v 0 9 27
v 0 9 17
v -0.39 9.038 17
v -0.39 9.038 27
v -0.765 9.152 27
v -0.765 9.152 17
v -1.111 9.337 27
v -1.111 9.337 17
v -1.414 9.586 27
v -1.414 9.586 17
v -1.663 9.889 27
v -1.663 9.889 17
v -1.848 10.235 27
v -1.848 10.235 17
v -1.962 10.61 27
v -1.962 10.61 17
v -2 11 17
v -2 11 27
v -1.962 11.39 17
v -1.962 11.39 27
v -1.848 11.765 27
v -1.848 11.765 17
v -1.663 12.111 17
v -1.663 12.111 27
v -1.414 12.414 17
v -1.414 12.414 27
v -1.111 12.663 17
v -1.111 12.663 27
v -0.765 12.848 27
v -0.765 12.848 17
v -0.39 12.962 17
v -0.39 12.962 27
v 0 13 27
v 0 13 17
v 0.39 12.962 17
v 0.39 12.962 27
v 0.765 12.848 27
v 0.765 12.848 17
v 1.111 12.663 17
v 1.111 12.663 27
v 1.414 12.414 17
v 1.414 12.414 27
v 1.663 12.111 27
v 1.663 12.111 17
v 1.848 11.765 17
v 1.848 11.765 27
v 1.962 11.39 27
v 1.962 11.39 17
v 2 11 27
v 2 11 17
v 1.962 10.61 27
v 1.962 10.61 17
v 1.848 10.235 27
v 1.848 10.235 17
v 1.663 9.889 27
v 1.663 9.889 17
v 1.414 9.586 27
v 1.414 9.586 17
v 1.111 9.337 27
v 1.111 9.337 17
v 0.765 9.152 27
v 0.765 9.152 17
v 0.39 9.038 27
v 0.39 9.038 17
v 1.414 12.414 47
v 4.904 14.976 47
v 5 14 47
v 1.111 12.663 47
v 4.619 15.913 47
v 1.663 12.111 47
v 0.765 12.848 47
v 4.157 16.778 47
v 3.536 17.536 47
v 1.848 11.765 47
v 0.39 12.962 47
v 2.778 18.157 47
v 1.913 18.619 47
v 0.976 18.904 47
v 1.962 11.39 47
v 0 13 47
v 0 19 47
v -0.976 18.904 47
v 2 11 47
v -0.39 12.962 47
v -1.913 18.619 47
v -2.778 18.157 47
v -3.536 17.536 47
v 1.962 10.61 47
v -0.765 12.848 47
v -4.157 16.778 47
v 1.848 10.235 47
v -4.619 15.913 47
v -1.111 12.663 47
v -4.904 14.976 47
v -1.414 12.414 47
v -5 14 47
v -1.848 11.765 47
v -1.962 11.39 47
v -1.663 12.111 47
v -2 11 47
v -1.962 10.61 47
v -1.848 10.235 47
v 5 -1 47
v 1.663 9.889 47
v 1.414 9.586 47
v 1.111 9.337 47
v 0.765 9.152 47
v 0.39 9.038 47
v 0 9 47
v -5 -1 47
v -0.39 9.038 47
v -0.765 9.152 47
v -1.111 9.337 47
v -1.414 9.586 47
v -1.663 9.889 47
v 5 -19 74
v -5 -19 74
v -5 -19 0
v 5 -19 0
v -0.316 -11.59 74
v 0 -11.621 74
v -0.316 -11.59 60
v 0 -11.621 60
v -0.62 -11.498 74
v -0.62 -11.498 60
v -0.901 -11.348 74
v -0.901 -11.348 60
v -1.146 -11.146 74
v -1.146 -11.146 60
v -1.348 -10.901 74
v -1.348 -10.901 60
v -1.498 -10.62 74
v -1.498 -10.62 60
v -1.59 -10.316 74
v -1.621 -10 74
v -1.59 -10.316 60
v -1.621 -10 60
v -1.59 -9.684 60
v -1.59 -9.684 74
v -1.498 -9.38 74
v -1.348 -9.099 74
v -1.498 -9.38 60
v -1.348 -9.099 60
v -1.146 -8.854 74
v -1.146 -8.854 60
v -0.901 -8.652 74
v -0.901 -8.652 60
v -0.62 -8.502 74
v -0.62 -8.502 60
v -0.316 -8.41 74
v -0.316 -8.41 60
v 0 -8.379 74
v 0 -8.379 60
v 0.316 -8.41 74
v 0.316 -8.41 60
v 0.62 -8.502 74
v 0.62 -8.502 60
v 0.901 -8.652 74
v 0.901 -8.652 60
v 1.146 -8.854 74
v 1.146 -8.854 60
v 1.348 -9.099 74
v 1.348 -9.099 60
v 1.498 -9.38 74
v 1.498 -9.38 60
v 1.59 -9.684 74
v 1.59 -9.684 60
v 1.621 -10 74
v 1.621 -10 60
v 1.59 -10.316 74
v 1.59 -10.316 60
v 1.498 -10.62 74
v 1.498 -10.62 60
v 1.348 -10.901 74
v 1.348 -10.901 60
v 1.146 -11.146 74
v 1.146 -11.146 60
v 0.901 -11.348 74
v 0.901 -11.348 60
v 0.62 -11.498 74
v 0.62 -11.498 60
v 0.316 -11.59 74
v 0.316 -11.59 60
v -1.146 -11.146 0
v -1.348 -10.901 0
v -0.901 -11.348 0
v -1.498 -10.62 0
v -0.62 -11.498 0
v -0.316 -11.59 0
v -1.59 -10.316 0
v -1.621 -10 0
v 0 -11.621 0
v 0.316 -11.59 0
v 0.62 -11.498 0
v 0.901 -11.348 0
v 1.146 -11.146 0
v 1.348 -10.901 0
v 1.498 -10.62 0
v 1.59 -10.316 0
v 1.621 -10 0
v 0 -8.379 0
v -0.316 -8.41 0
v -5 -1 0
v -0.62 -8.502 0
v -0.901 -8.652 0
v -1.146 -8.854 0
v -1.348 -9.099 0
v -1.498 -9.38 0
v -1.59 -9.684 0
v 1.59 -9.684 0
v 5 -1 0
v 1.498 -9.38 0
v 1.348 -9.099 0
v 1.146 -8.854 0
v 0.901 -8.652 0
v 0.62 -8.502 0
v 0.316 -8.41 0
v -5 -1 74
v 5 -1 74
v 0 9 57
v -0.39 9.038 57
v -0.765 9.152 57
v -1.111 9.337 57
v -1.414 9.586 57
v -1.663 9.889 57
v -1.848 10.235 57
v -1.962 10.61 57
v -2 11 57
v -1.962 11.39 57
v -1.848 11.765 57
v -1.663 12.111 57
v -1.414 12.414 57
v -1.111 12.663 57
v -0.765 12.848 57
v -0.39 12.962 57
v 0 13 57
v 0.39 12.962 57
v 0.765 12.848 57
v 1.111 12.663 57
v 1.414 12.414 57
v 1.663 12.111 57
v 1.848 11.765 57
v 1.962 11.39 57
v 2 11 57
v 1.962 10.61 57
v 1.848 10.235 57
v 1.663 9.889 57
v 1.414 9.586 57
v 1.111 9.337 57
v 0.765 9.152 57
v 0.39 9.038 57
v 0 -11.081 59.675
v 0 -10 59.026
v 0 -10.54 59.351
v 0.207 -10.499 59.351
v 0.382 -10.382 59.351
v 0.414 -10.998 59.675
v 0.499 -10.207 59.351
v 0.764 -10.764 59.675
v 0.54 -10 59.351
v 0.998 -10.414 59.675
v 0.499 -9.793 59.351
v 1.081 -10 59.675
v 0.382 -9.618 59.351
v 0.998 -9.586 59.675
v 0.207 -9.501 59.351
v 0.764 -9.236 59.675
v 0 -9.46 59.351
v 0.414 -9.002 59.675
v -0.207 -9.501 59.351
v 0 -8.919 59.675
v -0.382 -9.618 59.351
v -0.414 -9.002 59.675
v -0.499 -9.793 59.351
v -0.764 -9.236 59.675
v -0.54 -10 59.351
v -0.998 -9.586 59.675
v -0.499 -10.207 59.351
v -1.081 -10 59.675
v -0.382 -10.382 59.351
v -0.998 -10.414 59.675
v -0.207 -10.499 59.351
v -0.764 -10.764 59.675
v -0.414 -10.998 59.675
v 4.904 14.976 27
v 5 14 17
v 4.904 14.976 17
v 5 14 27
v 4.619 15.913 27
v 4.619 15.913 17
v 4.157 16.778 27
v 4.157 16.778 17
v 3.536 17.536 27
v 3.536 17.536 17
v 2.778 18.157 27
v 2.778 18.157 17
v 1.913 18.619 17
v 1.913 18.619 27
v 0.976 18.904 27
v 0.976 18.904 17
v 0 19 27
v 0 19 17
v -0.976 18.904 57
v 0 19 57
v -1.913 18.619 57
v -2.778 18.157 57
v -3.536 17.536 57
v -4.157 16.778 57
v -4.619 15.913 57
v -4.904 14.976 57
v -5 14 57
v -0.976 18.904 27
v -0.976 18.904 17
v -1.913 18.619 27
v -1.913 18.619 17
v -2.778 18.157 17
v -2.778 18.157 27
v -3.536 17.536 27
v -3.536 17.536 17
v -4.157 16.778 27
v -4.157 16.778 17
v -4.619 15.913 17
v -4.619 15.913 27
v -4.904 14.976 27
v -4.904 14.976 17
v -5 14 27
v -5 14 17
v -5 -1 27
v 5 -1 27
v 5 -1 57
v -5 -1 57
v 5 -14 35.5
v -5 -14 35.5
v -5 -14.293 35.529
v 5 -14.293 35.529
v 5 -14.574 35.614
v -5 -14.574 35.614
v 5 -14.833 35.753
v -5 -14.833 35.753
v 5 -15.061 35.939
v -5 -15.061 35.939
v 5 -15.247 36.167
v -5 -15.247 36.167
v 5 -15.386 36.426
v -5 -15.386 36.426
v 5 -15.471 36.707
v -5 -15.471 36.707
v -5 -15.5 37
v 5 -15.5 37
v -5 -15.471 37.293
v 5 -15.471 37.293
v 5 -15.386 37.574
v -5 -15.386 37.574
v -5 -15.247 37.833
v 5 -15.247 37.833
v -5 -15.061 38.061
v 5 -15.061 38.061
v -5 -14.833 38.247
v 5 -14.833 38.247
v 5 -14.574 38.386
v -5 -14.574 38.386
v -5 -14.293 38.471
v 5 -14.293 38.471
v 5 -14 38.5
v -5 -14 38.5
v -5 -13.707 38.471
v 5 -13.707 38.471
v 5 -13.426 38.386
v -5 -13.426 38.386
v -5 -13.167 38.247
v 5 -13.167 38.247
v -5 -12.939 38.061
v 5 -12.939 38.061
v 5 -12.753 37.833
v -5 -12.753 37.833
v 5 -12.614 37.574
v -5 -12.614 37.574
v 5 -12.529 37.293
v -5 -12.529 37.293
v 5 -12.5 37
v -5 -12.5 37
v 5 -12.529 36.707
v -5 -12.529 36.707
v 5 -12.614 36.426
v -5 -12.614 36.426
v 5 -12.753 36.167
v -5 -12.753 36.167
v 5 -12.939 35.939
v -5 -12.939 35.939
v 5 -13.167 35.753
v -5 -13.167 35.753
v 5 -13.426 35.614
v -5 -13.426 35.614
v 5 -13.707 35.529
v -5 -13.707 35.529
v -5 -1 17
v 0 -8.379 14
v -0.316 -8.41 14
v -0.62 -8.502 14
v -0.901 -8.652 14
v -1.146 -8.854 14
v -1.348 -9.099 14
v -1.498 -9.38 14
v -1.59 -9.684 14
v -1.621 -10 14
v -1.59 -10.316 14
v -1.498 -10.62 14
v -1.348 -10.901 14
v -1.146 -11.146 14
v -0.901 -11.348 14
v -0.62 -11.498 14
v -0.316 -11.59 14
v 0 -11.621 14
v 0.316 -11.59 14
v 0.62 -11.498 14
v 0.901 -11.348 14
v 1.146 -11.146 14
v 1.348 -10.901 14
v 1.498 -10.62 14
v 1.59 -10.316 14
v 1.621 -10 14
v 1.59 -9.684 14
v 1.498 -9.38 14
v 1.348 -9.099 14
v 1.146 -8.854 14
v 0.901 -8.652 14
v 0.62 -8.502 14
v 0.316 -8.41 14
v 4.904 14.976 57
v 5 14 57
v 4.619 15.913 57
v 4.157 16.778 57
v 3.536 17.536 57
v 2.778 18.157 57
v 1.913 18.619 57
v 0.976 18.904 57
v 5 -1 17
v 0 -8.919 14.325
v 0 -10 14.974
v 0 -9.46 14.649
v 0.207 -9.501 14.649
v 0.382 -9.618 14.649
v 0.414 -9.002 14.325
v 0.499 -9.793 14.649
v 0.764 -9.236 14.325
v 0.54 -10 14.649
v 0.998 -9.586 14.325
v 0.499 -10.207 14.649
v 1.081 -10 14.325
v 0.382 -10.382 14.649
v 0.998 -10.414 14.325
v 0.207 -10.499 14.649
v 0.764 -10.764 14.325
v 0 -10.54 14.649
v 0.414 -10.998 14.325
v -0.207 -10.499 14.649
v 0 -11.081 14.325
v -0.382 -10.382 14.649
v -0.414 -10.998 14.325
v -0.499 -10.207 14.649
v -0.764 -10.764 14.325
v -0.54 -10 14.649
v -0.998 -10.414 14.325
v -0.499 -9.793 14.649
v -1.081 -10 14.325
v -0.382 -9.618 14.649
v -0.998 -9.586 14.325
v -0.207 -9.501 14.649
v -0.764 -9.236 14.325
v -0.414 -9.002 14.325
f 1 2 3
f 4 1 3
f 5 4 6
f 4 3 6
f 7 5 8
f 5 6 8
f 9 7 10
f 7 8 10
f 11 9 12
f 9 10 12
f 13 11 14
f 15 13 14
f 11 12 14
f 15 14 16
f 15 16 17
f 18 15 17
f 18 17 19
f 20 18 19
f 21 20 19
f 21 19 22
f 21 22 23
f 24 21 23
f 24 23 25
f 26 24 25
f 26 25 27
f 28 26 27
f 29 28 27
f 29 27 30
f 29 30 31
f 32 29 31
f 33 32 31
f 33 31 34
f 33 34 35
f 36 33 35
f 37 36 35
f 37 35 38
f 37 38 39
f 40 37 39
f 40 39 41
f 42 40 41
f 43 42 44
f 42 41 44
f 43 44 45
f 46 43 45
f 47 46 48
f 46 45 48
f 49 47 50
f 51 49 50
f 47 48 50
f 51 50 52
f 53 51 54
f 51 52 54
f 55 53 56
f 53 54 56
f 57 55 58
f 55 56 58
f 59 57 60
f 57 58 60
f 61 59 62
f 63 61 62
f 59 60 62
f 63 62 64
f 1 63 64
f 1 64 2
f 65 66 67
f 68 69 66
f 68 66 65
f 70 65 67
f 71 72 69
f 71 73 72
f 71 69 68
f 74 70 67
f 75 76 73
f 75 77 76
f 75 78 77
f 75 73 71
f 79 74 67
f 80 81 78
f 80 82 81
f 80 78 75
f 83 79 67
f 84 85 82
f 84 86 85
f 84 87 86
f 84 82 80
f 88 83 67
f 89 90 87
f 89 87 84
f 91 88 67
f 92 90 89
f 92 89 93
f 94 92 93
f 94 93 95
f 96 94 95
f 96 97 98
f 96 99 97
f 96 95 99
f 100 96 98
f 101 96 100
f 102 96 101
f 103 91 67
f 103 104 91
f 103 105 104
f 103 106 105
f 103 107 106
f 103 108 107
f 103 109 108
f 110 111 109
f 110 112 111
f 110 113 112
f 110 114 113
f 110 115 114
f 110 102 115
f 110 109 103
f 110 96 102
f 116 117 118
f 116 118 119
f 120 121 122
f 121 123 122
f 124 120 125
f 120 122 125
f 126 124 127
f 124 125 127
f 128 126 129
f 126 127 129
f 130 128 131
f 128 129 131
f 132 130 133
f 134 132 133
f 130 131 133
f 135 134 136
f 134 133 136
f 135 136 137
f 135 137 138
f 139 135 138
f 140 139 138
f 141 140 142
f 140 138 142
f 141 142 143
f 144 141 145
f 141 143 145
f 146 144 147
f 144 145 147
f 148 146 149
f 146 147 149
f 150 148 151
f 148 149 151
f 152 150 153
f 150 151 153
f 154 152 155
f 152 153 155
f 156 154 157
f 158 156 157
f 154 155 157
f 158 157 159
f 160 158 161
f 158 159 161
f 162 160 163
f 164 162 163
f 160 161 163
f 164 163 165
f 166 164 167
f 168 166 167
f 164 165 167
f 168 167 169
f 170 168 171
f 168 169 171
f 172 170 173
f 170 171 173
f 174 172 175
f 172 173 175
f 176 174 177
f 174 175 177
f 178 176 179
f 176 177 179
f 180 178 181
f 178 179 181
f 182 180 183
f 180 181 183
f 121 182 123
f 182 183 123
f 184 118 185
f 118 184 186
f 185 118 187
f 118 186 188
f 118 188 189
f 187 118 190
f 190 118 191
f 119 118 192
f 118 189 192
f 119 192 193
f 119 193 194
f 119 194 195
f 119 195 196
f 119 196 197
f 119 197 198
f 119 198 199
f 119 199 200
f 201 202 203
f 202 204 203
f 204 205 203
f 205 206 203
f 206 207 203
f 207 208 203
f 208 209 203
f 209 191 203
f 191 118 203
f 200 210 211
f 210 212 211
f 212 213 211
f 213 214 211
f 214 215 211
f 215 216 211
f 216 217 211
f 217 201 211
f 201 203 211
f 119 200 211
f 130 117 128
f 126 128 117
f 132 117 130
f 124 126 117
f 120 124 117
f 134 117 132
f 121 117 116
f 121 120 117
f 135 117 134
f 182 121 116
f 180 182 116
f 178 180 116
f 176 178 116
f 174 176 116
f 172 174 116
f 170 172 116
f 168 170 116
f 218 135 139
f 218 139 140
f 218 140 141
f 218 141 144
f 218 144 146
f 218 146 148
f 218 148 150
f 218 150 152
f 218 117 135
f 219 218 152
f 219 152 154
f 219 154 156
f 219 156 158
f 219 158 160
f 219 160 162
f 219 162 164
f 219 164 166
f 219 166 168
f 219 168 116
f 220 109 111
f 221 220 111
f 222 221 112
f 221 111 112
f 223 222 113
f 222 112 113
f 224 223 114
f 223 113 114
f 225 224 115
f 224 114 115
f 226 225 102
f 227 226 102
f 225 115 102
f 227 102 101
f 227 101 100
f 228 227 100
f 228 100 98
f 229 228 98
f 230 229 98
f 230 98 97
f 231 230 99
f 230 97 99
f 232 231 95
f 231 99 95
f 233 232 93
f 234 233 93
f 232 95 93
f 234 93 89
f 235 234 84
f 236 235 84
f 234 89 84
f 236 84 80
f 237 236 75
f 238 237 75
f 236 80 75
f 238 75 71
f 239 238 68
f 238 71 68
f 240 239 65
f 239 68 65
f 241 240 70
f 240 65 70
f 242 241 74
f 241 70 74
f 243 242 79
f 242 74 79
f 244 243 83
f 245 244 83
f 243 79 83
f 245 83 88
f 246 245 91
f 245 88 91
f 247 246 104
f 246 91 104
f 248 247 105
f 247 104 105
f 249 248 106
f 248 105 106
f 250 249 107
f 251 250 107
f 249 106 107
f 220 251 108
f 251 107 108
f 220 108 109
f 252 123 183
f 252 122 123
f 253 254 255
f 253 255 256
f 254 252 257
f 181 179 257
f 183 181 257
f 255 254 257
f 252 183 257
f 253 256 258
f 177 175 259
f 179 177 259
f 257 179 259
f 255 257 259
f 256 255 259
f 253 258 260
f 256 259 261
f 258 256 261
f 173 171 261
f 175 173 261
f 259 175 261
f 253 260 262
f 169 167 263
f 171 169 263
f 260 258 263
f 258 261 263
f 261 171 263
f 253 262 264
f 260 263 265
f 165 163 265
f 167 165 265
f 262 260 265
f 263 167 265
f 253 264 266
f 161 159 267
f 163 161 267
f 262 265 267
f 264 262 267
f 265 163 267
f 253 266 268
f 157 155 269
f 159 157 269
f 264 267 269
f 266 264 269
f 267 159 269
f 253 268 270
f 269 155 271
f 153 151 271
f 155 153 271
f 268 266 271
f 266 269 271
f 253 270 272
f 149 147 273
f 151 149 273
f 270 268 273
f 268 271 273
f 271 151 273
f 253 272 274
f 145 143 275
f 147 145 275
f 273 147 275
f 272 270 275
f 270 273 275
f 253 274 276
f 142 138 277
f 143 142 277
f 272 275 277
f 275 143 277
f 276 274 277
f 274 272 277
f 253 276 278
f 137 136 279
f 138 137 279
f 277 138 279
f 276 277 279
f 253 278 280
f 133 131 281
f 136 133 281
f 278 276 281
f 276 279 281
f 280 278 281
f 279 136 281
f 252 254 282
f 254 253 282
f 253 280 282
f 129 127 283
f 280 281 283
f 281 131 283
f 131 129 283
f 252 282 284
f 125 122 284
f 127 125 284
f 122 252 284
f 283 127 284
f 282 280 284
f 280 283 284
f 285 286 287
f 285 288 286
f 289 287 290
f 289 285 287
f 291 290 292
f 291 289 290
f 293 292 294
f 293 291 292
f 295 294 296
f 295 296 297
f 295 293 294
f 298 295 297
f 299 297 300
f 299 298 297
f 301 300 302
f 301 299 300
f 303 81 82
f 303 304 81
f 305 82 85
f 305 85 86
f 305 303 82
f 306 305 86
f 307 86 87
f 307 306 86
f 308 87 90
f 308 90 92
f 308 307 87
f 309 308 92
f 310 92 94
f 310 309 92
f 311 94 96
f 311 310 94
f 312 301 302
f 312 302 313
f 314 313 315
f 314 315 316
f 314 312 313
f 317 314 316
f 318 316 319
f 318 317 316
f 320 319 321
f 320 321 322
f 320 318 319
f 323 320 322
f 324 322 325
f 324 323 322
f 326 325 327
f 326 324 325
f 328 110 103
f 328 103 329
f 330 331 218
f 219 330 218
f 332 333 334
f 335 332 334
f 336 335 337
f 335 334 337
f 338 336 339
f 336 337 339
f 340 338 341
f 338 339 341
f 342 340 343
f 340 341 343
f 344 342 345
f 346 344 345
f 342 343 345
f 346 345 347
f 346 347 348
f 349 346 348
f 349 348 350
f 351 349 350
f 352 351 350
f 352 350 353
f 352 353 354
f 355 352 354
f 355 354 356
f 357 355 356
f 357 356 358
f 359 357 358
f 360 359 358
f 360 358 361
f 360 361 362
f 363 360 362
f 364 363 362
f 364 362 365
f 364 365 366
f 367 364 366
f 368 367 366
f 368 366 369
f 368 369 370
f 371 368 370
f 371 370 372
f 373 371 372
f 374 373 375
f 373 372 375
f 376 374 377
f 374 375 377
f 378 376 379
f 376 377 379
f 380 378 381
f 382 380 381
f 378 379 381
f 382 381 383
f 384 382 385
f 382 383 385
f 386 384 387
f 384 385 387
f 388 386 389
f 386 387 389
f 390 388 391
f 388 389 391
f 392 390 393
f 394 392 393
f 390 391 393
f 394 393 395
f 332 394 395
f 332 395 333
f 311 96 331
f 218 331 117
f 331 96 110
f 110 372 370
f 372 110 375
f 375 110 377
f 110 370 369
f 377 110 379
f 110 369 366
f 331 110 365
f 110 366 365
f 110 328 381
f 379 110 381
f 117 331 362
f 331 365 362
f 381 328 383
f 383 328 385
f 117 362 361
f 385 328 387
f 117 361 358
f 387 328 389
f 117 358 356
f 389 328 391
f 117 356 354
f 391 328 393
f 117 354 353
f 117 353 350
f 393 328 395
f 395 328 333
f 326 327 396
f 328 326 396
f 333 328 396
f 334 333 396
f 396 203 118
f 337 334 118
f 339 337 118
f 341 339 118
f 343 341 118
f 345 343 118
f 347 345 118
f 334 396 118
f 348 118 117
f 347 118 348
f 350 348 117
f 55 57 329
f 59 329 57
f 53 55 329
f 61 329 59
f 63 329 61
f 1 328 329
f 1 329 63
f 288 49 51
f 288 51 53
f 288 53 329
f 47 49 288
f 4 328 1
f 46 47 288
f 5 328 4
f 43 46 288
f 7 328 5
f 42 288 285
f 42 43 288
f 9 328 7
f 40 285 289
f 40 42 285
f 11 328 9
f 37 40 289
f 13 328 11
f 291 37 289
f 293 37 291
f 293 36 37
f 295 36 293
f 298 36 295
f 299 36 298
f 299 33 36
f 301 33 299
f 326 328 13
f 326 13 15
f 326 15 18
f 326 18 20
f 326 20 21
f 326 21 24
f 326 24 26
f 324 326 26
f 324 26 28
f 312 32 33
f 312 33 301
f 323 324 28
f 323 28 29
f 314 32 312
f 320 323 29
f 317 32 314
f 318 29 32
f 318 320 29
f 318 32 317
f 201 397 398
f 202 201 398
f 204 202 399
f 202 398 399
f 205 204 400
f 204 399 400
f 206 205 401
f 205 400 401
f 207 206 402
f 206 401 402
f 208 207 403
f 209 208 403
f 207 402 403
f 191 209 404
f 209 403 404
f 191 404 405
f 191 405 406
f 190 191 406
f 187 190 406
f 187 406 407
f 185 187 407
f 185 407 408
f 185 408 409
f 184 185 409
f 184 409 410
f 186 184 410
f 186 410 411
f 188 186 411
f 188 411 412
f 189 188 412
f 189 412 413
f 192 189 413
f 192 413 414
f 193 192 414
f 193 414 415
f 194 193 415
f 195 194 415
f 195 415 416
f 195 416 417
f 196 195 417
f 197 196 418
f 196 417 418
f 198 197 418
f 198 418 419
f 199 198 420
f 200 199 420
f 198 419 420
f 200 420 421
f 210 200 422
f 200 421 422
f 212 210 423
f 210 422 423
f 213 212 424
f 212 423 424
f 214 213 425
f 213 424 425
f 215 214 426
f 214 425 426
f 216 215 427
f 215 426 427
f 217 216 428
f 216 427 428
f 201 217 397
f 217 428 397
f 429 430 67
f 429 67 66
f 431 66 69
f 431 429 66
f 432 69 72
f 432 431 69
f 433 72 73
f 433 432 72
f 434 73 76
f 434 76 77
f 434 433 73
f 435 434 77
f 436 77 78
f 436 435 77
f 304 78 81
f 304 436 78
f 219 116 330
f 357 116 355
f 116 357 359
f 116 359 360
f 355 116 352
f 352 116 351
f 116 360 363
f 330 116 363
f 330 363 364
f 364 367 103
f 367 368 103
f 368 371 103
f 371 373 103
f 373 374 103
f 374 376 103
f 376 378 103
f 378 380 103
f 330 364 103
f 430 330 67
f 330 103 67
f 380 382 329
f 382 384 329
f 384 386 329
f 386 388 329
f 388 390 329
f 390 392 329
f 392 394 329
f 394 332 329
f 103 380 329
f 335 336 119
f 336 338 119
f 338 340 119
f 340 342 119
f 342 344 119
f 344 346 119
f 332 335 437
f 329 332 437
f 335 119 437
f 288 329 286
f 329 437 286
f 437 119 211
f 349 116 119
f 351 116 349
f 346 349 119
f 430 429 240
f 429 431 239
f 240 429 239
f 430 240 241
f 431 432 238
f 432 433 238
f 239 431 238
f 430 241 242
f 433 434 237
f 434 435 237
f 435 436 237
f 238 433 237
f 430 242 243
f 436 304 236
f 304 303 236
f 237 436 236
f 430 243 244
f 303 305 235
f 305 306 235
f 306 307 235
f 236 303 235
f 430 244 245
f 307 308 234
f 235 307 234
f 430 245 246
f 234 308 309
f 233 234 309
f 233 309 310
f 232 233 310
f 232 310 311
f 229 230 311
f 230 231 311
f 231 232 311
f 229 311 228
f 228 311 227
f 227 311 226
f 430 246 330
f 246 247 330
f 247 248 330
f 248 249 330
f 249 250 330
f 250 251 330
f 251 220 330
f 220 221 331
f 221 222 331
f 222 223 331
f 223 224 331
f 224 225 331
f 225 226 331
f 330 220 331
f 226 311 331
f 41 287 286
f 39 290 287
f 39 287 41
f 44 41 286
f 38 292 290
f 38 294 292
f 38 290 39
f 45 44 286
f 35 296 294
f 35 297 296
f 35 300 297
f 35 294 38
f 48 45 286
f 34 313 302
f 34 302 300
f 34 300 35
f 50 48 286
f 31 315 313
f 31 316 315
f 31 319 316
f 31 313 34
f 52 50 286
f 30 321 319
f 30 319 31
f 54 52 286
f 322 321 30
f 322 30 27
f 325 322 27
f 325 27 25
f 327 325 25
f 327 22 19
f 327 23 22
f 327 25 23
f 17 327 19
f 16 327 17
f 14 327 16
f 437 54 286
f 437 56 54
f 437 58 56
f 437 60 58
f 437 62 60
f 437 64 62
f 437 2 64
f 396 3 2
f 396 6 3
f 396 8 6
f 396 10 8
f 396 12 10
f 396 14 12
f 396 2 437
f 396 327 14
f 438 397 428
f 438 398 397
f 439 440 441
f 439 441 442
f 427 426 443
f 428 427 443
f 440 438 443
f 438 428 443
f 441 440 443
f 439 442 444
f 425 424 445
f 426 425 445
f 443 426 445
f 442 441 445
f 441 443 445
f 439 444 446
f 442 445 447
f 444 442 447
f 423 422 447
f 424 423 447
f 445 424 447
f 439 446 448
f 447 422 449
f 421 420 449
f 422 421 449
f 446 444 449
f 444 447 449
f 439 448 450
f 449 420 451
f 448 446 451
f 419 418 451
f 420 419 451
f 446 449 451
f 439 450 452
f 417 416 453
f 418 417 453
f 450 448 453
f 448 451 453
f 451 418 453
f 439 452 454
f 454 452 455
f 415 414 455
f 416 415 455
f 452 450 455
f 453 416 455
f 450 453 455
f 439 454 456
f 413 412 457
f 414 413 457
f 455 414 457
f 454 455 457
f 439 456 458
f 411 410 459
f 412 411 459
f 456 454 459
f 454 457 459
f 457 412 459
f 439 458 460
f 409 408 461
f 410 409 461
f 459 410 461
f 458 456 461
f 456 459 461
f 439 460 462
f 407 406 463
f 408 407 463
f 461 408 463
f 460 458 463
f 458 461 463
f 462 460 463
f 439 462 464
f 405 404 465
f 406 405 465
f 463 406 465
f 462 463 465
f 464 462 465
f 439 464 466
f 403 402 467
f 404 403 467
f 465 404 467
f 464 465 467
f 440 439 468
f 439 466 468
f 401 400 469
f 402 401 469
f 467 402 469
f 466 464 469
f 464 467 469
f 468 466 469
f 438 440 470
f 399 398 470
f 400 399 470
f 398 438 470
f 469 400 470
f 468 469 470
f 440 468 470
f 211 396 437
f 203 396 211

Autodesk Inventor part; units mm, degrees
ref_plane "YZ Plane" through (0, 0, 0) normal (1, 0, 0) x (0, 1, 0)
ref_plane "XZ Plane" through (0, 0, 0) normal (0, 1, 0) x (-1, 0, 0)
ref_plane "XY Plane" through (0, 0, 0) normal (0, 0, 1) x (1, 0, 0)
sketch "Skizze1" plane through (0, 0, 0) normal (0, 0, 1) x (1, 0, 0)
  line L0 (5, 19) -> (-5, 19)
  line L1 (-5, 19) -> (-5, -19)
  line L2 (-5, -19) -> (5, -19)
  line L3 (5, -19) -> (5, 19)
  line L4 (5, 19) -> (-5, -19) construction
  line L5 (-5, 19) -> (5, -19) construction
  point P0 (0, 0)
  dimension "d0" = 38
  dimension "d1" = 10
extrude "Extrusion1" add sketch "Skizze1" along normal blind 74
sketch "Skizze2" plane through (-5, -19, 0) normal (-1, 0, 0) x (0, 0, 1)
  line L0 (0, 38) -> (74, 38) projected
  line L1 (0, 38) -> (17, 38)
  line L2 (17, 38) -> (17, 18)
  line L3 (17, 18) -> (0, 18)
  line L4 (0, 18) -> (0, 38)
  line L5 (74, 38) -> (57, 38)
  line L6 (57, 38) -> (57, 18)
  line L7 (57, 18) -> (74, 18)
  line L8 (74, 18) -> (74, 38)
  line L9 (27, 38) -> (47, 38)
  line L10 (47, 38) -> (47, 18)
  line L11 (47, 18) -> (27, 18)
  line L12 (27, 18) -> (27, 38)
  line L13 (0, 0) -> (74, 0) projected
  point P0 (0, 19)
  dimension "d4" = 18
  dimension "d5" = 20
  dimension "d6" = 40
  dimension "d7" = 10
  dimension "d8" = 18
  dimension "d9" = 18
extrude "Extrusion2" cut sketch "Skizze2" against normal blind 74
fillet "Rundung1" radius 5 4 edges at (-5, 19, 22) (-5, 19, 52) (5, 19, 52) (5, 19, 22)
sketch "Skizze5" plane through (0, 0, 74) normal (0, 0, 1) x (1, 0, 0)
  line L0 (5, -19) -> (-5, -19) projected
  line L1 (-5, -19) -> (-5, -1) projected
  point P0 (0, 0)
  point P1 (0, -10)
  dimension "d33" = 9
  dimension "d34" = 5
hole "Bohrung3" at (0, -10, 74) direction (0, 0, -1) diameter 3.242 depth 14 tip angle 118 thread size "M4x0.7" class "6H" standard "ISO Metric profile"
sketch "Skizze6" plane through (0, 0, 0) normal (0, 0, -1) x (-1, 0, 0)
  line L0 (5, -1) -> (5, -19) projected
  line L1 (5, -19) -> (-5, -19) projected
  point P0 (0, 0)
  point P1 (0, -10)
  dimension "d42" = 5
  dimension "d43" = 9
hole "Bohrung4" at (0, -10, 0) direction (0, 0, 1) diameter 3.242 depth 14 tip angle 118 thread size "M4x0.7" class "6H" standard "ISO Metric profile"
sketch "Skizze7" plane through (5, -19, 74) normal (1, 0, 0) x (0, 0, -1)
  line L0 (74, 0) -> (0, 0) projected
  line L1 (0, 18) -> (0, 0) projected
  point P0 (74, 19)
  point P1 (37, 5)
  dimension "d51" = 5
  dimension "d52" = 37
hole "Bohrung5" at (5, -14, 37) direction (-1, 0, 0) diameter 3 end through all
sketch "Skizze8" plane through (-5, -1, 57) normal (0, 0, 1) x (1, 0, 0)
  line L0 (10, 0) -> (0, 0) projected
  line L1 (0, 0) -> (0, 15) projected
  point P0 (5, 1)
  point P1 (5, 12)
  dimension "d60" = 12
  dimension "d61" = 5
hole "Bohrung6" at (0, 11, 57) direction (0, 0, -1) diameter 4 end through all
properties part number "ABI_Führungsblock"
